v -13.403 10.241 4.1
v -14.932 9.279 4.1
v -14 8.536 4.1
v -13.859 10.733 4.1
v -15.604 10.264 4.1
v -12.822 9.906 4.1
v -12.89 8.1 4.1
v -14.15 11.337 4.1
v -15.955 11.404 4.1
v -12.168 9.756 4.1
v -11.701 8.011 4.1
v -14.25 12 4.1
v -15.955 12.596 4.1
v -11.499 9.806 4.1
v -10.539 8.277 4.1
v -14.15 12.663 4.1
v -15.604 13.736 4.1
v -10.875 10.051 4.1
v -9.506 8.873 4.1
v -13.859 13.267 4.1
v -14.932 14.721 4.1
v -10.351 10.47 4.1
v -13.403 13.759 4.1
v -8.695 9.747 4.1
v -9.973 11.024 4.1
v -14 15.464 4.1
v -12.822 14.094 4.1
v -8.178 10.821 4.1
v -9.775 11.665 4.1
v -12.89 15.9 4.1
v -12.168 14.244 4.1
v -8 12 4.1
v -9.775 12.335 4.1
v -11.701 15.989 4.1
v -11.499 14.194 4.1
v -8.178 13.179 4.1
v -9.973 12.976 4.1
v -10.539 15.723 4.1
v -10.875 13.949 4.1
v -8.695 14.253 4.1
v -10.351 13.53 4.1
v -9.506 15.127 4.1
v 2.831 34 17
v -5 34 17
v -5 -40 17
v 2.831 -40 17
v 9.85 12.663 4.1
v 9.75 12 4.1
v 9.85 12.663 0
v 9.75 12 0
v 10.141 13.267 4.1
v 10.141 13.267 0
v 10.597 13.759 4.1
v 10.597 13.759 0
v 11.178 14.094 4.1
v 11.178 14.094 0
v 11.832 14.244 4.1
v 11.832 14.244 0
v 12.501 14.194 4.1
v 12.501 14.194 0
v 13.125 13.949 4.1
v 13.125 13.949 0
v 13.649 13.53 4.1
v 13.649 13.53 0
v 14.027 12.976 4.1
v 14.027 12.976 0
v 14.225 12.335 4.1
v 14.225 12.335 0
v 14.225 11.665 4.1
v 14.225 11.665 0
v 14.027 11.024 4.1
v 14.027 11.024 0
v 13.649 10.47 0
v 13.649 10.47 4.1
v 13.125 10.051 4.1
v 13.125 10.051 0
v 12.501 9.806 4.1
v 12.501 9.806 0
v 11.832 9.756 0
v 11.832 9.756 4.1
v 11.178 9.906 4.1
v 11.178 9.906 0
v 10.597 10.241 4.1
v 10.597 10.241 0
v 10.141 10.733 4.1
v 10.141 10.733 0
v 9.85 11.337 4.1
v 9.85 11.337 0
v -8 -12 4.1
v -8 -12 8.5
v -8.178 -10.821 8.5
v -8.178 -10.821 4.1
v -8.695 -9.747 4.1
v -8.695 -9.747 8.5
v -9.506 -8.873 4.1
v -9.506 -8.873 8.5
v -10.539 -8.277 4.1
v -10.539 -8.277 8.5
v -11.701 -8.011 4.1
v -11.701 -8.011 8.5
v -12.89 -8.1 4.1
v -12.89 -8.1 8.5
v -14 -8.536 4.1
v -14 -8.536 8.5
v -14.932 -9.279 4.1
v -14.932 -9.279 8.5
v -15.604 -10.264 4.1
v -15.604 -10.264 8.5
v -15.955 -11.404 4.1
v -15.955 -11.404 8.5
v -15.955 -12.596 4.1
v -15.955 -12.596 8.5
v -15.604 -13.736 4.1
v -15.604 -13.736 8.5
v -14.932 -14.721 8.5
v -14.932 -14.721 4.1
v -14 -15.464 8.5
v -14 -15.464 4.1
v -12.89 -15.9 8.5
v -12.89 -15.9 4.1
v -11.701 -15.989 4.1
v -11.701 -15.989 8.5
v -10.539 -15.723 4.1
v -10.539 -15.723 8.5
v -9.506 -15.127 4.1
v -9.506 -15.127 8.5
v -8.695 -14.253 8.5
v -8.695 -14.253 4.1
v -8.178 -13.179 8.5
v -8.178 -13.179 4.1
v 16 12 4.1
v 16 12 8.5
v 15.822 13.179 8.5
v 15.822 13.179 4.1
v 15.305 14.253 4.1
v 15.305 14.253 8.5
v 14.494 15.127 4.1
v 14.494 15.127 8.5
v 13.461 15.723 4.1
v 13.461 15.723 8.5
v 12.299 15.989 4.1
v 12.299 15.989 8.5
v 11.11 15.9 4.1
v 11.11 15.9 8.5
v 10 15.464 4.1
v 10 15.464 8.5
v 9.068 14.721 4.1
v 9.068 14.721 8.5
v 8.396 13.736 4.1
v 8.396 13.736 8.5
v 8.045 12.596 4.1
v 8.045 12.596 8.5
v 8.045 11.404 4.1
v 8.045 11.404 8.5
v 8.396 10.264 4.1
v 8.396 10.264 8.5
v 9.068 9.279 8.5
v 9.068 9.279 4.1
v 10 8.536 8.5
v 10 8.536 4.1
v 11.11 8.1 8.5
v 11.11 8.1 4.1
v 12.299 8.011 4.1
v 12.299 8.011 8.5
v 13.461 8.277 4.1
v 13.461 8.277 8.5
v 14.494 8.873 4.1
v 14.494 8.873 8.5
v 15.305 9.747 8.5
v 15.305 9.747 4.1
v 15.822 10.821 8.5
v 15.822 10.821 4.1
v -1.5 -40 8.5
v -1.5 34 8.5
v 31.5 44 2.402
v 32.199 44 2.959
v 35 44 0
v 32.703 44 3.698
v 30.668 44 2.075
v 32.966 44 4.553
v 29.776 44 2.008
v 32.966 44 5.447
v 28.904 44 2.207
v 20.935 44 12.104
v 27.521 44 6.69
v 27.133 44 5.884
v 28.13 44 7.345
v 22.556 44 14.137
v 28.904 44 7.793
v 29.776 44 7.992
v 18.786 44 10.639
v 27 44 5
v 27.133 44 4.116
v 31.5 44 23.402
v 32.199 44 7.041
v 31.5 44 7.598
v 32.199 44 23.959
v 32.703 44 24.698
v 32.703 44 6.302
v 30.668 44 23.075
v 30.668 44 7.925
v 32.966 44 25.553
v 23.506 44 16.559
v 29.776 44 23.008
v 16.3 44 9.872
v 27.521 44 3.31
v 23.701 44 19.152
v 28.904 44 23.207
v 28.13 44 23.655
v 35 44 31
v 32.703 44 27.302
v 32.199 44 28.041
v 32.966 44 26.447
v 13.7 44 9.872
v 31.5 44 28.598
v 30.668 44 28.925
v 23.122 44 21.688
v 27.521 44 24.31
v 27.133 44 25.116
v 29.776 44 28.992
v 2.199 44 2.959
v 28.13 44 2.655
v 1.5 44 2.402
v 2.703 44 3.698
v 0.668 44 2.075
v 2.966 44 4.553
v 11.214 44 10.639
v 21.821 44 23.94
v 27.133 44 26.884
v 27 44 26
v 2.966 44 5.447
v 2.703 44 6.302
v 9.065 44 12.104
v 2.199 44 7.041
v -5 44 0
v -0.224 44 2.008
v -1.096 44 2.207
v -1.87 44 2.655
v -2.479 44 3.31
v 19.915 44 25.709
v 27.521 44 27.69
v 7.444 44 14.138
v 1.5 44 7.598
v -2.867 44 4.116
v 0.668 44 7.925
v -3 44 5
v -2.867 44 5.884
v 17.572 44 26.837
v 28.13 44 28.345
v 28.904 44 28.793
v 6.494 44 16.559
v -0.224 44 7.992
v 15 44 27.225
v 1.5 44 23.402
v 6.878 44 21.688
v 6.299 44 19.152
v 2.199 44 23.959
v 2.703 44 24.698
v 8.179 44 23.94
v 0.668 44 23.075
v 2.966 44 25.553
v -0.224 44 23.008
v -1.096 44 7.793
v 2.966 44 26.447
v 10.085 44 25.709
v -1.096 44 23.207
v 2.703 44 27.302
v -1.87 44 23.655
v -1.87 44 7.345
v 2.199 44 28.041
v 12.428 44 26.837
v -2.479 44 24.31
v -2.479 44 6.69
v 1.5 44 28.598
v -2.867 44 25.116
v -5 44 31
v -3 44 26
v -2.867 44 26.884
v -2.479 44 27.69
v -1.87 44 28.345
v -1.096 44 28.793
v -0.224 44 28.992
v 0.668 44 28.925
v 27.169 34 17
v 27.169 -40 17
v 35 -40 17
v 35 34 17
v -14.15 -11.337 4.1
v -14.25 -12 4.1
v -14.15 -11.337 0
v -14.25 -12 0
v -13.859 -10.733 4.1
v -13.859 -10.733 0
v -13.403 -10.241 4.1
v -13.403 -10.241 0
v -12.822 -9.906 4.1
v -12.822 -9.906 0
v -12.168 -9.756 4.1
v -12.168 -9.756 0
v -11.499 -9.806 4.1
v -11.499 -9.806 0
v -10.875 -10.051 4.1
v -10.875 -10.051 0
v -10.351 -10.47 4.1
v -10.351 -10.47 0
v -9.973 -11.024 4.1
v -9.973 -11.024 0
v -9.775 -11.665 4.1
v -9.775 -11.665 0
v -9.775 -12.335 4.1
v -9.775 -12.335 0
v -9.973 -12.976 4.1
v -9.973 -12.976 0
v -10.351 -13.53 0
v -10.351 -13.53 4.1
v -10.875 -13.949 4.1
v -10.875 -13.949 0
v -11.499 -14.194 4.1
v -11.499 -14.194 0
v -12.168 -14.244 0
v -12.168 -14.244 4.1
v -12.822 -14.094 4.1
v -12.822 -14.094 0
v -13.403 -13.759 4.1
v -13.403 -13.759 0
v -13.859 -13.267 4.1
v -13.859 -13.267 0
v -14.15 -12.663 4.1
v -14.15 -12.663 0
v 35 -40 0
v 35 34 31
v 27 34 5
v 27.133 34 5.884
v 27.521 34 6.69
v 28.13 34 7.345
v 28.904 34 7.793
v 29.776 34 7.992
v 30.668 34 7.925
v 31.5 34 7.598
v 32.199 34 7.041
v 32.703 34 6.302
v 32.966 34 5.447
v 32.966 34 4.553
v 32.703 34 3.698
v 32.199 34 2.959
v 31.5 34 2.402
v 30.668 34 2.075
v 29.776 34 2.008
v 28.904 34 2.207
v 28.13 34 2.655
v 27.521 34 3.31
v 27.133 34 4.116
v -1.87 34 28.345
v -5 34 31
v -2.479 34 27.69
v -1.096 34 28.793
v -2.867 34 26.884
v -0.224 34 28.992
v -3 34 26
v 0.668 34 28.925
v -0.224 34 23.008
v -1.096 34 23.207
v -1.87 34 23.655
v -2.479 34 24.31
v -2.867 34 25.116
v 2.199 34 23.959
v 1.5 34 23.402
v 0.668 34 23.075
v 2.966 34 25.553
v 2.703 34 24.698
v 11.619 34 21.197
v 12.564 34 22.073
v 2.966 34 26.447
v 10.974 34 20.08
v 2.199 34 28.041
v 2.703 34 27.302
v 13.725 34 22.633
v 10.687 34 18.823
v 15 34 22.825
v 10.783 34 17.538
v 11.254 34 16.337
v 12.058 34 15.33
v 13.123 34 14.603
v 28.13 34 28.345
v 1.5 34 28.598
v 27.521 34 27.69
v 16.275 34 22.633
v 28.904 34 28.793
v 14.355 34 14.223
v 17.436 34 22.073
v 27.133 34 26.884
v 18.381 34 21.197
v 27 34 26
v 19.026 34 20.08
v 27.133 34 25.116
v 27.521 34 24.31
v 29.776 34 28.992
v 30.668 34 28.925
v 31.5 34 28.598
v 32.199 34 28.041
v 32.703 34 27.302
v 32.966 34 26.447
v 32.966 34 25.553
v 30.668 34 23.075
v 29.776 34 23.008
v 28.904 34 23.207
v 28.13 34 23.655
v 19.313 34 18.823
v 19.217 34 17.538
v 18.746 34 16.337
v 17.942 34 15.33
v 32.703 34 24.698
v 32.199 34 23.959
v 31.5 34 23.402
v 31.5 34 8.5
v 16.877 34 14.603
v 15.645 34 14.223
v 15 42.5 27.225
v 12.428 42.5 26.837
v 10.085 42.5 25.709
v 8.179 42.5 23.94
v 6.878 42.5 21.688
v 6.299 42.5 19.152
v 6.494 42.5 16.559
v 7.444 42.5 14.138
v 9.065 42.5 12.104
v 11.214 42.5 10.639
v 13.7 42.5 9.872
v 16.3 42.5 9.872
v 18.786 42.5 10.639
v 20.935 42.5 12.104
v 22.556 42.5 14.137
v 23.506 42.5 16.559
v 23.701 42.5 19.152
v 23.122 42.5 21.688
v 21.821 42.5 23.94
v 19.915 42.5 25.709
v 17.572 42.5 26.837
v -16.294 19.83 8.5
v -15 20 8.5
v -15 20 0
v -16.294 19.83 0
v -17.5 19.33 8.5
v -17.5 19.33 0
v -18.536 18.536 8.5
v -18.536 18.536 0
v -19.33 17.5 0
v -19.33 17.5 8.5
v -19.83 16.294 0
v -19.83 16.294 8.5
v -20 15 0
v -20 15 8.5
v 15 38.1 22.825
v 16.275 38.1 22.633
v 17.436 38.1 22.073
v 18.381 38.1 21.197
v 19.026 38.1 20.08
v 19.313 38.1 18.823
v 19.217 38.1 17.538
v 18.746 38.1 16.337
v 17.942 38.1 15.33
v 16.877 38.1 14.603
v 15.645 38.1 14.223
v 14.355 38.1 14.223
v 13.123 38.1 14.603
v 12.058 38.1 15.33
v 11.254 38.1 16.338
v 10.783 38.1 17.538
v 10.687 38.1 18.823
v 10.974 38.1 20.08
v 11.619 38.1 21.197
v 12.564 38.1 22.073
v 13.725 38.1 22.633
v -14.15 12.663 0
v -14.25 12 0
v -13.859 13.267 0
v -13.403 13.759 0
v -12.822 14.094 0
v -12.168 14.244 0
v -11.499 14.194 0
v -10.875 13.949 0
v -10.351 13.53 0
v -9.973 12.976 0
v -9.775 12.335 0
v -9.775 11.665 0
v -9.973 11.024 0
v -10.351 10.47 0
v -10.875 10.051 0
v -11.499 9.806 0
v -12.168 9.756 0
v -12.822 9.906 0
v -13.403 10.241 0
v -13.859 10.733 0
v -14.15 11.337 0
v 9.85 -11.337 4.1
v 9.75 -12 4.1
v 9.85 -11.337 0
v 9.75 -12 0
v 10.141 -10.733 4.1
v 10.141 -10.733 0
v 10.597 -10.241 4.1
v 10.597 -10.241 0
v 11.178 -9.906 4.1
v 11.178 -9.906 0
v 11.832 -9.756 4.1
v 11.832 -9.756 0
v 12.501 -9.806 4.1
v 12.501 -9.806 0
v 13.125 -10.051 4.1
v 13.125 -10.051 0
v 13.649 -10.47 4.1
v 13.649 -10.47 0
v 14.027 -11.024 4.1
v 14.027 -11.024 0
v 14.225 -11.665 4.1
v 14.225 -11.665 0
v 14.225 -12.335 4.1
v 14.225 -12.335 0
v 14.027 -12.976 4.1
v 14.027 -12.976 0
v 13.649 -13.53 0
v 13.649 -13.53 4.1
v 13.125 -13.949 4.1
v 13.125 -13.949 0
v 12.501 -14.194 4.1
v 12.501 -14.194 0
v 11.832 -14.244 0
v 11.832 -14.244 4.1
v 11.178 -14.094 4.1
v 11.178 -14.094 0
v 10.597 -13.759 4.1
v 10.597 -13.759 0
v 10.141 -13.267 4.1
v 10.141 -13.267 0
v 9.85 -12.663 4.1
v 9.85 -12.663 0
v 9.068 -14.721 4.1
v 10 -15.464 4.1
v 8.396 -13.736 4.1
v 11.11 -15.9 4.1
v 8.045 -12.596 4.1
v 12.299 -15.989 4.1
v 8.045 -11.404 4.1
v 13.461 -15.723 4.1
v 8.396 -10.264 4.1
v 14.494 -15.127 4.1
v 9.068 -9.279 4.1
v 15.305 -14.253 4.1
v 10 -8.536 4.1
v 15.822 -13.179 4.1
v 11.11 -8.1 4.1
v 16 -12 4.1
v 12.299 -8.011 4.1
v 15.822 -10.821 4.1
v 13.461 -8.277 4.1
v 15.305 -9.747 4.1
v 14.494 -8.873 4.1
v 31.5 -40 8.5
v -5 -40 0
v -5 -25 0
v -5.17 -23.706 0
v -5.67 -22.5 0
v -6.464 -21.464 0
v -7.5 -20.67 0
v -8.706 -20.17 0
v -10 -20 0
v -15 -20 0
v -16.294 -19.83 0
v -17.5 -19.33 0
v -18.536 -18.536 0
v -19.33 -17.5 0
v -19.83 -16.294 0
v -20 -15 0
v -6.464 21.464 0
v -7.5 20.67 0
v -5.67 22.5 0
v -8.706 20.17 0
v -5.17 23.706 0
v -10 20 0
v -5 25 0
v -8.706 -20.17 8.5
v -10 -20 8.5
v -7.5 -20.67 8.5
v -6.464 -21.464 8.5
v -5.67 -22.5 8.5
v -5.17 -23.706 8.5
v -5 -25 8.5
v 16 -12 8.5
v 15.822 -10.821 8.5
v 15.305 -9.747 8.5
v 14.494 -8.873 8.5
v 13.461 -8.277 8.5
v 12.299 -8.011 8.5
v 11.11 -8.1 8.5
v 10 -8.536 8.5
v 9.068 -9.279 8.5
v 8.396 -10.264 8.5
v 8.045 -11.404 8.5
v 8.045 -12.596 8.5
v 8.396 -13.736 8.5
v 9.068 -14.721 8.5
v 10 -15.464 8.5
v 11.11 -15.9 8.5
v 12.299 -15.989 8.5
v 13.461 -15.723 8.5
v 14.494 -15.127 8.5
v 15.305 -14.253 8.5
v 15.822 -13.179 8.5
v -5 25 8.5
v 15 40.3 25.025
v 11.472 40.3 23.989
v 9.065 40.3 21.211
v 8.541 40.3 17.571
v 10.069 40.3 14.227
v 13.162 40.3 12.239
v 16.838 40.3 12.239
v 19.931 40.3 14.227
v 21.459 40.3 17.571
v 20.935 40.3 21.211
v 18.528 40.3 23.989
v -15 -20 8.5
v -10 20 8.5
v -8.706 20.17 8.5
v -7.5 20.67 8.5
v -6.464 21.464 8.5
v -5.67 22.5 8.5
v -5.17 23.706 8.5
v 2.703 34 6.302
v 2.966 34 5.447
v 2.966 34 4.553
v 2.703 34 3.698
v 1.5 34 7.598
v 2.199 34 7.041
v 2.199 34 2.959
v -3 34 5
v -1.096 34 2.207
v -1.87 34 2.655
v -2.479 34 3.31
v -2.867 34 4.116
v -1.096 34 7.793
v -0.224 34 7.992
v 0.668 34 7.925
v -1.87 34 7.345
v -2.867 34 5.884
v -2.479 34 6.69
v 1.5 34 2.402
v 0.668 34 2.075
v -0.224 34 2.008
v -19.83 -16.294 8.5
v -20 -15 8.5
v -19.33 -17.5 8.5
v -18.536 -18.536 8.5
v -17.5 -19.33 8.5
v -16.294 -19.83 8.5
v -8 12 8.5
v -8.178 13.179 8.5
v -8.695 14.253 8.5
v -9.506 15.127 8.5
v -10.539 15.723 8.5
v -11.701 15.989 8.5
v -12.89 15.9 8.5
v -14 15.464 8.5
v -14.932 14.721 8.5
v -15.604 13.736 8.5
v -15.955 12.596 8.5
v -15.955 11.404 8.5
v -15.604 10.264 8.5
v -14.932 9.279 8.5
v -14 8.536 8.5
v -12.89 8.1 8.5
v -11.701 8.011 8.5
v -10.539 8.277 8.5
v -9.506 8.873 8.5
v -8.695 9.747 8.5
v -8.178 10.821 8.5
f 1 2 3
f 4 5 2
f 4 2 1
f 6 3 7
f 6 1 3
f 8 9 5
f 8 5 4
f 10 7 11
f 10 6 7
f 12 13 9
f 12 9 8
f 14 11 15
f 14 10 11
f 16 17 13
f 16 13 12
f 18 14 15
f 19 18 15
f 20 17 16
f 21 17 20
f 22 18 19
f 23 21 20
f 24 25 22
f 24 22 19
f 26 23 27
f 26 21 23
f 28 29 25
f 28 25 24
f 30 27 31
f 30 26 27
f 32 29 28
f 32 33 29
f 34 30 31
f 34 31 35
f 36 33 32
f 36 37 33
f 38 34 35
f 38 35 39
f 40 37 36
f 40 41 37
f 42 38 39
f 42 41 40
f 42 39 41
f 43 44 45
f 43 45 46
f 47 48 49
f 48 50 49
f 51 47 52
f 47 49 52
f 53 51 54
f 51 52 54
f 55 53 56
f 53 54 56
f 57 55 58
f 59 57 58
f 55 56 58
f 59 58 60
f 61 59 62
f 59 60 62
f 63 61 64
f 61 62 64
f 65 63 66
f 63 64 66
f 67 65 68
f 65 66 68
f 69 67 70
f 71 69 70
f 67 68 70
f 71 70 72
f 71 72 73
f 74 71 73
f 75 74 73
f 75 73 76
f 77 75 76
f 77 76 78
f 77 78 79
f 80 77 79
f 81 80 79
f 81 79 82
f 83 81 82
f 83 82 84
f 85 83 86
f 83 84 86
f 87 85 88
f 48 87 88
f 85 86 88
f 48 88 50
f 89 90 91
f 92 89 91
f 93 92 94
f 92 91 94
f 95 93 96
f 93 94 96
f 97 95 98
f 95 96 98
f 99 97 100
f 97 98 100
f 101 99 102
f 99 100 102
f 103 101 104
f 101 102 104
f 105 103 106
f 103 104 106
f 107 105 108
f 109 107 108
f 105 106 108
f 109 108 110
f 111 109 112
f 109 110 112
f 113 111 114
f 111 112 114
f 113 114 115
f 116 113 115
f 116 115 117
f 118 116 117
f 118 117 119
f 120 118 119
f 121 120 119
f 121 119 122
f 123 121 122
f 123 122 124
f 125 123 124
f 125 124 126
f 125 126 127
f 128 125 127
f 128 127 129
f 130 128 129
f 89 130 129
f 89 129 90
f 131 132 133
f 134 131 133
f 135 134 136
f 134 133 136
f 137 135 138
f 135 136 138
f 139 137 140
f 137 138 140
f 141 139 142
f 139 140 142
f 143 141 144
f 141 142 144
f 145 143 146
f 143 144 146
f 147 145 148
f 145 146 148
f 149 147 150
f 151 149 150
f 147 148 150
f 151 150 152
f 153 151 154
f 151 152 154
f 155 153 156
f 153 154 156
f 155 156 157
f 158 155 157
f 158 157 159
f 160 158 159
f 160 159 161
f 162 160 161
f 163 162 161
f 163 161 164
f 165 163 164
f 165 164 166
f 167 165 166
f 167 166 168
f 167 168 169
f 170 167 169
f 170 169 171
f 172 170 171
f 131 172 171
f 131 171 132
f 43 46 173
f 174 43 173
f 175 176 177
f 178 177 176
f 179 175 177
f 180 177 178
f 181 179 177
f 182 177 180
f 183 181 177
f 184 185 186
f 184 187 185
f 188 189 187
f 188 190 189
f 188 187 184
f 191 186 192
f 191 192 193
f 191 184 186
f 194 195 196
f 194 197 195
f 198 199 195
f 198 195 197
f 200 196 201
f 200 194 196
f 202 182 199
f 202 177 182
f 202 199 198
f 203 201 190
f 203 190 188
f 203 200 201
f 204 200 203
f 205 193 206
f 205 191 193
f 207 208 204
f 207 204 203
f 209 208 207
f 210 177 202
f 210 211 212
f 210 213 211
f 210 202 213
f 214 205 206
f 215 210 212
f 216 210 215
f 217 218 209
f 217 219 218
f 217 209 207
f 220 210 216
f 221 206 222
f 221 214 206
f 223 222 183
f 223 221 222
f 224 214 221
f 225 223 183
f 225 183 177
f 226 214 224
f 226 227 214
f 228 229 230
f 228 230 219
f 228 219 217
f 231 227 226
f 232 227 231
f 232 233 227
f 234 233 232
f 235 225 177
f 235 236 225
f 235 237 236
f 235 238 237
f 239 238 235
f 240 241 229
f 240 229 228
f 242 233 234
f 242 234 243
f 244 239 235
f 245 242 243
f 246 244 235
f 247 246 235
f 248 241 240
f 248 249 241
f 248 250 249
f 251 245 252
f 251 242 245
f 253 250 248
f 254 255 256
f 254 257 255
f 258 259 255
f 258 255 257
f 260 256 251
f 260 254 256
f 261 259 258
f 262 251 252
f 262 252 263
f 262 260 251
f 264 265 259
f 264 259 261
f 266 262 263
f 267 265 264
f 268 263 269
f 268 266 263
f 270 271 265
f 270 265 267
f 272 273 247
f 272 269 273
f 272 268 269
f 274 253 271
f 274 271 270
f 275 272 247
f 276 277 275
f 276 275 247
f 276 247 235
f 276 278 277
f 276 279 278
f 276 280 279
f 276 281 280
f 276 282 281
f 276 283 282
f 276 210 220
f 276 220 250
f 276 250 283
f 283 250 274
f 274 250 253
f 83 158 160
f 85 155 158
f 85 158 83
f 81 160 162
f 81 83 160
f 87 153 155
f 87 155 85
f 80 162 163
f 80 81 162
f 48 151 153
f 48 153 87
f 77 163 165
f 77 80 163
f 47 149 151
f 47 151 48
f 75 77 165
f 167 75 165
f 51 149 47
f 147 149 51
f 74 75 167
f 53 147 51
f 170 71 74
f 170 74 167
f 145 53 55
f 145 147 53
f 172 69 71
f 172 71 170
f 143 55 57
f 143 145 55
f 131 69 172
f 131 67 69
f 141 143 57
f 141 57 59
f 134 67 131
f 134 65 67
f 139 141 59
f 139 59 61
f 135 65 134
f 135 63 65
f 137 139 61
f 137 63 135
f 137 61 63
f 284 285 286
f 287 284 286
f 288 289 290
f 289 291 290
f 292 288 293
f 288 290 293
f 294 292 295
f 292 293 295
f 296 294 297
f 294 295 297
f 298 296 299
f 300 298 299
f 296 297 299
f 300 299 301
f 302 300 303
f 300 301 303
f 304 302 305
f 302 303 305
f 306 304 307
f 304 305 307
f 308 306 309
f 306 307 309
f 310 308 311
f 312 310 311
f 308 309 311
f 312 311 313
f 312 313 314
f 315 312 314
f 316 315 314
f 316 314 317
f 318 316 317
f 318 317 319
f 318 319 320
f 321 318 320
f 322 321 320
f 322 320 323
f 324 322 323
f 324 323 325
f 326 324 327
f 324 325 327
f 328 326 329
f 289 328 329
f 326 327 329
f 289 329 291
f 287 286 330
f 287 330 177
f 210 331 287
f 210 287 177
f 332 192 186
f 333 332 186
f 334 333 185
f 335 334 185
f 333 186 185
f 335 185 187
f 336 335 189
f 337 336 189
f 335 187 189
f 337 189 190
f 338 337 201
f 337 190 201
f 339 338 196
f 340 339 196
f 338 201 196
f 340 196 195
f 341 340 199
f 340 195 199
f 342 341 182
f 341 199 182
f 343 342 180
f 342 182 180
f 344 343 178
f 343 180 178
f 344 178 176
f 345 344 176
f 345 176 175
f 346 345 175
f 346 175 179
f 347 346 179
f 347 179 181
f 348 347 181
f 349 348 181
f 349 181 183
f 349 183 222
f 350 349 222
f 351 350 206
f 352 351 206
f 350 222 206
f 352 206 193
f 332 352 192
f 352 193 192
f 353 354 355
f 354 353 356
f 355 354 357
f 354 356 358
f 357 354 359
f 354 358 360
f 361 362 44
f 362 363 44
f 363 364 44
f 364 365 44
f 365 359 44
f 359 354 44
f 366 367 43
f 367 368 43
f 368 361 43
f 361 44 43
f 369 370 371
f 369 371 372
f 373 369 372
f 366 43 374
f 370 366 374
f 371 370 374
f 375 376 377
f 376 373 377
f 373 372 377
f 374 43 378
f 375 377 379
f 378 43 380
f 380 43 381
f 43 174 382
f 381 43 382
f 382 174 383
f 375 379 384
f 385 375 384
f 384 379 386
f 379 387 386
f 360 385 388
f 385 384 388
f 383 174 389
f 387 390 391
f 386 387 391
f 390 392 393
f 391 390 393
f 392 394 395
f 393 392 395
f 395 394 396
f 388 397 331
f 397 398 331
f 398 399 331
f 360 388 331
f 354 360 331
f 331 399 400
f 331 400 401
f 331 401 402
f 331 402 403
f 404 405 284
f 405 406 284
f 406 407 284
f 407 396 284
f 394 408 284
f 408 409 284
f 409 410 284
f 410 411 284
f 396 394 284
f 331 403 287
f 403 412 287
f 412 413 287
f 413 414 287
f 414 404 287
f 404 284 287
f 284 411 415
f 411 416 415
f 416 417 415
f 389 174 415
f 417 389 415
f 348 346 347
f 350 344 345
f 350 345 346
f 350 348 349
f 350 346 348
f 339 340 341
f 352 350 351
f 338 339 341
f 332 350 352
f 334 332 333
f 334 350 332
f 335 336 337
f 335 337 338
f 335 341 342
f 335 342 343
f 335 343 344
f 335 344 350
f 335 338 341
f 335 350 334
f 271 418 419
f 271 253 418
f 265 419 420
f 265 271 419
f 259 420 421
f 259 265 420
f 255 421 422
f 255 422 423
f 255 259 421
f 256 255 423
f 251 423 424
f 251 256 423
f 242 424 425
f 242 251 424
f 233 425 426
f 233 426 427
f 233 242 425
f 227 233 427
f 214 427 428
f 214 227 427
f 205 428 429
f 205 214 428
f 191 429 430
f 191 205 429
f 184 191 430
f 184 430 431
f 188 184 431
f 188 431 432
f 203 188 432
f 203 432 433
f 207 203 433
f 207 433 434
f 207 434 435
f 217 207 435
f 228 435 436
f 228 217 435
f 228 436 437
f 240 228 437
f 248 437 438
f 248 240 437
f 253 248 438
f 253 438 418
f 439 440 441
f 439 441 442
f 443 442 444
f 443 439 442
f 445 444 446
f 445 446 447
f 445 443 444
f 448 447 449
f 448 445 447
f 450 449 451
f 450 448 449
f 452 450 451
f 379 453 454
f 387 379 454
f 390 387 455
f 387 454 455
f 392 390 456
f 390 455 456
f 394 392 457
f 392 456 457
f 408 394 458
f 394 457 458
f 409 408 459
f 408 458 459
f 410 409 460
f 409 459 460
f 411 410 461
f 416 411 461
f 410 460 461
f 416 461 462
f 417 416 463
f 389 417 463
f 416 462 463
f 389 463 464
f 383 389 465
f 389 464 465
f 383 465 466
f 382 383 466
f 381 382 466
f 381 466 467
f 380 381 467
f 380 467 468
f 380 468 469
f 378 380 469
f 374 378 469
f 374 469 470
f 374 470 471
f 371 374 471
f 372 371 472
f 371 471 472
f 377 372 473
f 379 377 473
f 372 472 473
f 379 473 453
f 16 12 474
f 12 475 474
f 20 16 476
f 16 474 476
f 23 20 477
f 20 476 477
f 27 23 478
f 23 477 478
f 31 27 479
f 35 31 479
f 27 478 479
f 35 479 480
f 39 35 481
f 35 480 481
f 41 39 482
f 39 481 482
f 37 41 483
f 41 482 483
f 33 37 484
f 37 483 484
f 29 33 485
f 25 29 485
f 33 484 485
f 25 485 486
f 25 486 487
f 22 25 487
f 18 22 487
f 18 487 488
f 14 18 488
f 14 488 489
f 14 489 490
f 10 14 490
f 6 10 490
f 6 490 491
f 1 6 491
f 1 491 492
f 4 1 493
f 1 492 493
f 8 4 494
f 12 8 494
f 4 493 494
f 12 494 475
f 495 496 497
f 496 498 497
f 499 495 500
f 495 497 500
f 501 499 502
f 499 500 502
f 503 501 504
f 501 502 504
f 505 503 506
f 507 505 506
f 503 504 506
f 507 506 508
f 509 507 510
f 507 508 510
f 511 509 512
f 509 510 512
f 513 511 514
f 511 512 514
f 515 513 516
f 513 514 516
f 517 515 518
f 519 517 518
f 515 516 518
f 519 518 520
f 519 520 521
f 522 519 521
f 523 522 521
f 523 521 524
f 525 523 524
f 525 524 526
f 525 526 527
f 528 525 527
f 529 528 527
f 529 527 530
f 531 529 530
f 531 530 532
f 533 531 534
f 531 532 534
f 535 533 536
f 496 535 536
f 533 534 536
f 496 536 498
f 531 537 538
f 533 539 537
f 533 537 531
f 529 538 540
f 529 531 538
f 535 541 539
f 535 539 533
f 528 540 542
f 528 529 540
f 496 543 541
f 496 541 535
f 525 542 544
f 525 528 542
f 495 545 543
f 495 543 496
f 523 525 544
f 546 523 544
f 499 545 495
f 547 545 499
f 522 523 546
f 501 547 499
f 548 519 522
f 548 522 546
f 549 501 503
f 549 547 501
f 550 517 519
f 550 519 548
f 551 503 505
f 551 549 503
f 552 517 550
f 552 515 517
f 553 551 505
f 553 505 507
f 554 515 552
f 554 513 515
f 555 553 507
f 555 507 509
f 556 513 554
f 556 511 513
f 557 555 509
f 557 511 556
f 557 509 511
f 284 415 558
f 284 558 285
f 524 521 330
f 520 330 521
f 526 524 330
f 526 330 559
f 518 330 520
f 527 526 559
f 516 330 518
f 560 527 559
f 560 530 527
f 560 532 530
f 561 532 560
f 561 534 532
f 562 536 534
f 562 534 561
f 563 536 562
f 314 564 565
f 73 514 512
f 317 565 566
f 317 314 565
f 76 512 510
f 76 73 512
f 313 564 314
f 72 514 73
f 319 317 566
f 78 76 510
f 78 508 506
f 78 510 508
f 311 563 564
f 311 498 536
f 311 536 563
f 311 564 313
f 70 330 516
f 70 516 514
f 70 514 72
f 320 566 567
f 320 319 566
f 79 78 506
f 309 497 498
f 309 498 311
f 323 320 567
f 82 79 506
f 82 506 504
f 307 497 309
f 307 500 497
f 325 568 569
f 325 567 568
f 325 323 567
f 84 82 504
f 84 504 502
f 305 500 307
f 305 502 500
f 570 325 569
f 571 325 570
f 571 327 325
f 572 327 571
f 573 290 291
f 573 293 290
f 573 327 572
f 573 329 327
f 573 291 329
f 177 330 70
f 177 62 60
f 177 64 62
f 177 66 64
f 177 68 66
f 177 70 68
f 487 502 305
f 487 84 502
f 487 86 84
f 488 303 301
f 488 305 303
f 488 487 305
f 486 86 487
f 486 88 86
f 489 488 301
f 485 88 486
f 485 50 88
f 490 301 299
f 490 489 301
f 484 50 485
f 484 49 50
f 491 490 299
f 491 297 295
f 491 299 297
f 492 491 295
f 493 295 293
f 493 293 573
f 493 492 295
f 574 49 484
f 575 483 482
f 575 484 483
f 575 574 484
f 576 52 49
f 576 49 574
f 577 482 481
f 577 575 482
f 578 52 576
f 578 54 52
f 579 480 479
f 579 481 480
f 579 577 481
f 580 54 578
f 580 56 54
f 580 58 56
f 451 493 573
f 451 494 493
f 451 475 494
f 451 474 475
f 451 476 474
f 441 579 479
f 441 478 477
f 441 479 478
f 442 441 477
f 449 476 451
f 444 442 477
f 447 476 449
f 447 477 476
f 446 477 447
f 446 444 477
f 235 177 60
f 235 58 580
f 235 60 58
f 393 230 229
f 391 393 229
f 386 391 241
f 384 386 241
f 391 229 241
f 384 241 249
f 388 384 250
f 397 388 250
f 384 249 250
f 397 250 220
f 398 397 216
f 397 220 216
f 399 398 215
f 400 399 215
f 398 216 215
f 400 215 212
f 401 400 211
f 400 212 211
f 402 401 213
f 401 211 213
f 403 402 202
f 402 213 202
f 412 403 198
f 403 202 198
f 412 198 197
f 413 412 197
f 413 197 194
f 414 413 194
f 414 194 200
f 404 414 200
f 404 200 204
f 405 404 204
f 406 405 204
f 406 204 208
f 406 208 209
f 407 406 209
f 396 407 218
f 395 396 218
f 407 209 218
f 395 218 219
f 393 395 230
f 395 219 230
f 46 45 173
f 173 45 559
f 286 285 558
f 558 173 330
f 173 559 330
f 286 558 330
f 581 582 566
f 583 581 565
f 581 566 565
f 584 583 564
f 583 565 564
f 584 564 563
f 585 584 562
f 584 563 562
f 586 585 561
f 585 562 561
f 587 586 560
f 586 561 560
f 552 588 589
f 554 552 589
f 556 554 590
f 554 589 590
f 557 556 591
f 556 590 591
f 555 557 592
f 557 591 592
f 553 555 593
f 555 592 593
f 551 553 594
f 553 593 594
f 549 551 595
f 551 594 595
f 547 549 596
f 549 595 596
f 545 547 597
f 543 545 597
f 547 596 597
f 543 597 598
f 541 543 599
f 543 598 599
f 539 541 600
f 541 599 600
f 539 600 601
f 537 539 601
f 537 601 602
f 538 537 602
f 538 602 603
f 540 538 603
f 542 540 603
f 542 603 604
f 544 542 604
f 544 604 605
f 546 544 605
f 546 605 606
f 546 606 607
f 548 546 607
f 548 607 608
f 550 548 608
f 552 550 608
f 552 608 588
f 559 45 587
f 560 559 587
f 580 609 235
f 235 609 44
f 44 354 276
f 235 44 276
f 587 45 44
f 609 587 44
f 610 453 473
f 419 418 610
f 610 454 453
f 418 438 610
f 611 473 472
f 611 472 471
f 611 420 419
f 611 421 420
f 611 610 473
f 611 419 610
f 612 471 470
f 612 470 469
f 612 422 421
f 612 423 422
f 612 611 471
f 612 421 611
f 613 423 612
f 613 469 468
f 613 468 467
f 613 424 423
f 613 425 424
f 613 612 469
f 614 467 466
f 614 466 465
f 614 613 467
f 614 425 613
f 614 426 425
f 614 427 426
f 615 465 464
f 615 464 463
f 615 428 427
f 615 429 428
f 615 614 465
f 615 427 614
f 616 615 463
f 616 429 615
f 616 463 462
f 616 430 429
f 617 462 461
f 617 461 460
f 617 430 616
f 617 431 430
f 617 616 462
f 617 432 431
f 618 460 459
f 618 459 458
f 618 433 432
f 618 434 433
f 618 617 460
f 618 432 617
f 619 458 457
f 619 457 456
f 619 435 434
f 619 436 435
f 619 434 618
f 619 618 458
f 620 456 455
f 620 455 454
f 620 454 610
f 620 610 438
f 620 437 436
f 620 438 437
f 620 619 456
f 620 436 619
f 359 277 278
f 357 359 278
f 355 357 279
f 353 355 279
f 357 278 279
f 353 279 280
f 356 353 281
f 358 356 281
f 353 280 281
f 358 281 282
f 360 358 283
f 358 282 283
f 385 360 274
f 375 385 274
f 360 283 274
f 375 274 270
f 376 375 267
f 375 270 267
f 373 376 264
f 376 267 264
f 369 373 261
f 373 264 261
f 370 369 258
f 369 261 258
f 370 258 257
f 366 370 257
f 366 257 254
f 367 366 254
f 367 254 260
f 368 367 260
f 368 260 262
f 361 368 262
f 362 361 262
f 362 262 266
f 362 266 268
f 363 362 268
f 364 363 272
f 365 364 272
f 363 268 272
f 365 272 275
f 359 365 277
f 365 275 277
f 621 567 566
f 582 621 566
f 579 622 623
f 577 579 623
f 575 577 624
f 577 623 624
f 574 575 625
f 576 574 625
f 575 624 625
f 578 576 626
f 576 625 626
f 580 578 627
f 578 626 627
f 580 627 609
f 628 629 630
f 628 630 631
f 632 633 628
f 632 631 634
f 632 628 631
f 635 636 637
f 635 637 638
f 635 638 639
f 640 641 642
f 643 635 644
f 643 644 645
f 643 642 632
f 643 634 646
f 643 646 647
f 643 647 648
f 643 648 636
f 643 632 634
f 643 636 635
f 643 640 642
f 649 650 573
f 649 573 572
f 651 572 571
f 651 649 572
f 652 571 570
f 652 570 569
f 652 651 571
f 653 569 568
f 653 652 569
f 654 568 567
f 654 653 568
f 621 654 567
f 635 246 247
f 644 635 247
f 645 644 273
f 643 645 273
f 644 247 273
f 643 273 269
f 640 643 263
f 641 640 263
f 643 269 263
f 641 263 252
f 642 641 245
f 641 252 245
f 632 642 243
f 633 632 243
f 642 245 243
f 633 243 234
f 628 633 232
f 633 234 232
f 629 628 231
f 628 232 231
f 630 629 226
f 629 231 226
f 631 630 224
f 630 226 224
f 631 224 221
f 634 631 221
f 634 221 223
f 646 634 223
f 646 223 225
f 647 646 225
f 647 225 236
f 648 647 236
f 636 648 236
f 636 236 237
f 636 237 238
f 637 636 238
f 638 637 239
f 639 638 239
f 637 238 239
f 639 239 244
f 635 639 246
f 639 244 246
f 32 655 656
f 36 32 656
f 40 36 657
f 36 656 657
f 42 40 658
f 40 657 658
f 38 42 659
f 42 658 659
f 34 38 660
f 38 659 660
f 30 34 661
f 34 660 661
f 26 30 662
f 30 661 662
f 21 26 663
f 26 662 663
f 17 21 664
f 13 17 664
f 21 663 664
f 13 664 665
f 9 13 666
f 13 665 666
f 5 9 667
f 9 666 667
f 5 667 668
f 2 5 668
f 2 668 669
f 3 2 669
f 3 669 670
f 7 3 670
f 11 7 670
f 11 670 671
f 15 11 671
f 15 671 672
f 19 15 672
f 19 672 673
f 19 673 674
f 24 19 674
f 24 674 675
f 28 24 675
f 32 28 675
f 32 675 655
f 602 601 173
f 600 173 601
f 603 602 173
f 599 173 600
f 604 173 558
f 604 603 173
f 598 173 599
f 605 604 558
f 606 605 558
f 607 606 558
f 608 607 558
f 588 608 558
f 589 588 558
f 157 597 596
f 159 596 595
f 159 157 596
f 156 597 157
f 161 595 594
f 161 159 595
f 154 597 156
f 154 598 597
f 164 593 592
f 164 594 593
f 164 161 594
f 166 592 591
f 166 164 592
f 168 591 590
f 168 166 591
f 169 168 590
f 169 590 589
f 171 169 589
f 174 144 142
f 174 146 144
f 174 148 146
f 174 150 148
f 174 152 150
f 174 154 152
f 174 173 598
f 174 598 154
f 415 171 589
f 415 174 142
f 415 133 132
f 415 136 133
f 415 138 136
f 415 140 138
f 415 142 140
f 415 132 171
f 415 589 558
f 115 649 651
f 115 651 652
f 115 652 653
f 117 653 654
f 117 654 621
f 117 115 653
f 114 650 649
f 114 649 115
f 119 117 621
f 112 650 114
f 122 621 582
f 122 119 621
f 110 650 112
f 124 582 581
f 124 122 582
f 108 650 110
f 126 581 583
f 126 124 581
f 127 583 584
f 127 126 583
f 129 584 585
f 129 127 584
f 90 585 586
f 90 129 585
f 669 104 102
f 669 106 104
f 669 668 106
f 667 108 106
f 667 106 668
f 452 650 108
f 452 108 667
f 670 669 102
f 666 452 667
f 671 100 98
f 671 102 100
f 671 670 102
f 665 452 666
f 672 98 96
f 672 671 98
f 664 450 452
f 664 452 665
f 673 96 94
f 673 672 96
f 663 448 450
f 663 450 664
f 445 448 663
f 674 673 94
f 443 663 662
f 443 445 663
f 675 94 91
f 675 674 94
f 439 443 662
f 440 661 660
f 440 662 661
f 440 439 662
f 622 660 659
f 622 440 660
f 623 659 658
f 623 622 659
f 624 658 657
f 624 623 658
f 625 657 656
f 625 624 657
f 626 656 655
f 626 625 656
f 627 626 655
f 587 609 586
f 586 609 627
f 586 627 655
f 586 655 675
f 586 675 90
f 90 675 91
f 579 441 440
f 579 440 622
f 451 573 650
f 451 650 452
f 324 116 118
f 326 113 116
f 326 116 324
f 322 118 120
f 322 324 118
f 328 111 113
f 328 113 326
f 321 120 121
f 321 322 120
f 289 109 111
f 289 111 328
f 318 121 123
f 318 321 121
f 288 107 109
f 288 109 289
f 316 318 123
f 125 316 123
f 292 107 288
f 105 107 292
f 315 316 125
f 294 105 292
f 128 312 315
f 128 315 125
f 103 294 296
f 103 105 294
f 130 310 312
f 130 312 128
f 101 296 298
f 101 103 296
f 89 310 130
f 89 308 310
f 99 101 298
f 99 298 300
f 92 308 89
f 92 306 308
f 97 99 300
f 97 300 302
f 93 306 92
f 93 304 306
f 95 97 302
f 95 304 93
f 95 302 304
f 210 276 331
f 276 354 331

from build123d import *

# Parameters (mm, degrees)
BOSS_EXTRUDE1_OUTLINE_W                             = 55
BOSS_EXTRUDE1_OUTLINE_H                             = 40
BOSS_EXTRUDE1_DEPTH                                 = 10
SKETCH5_W                                           = 40
SKETCH5_H                                           = 14
BOSS_EXTRUDE2_DEPTH                                 = 40
CUT_EXTRUDE3_DEPTH                                  = 74
SKETCH7_W                                           = 40
SKETCH7_H                                           = 6
BOSS_EXTRUDE3_DEPTH                                 = 14
SKETCH11_W                                          = 40
SKETCH11_H                                          = 28
BOSS_EXTRUDE5_DEPTH                                 = 4
SKETCH12_W                                          = 40
SKETCH12_H                                          = 24
SKETCH12_H_2                                        = 20
BOSS_EXTRUDE6_DEPTH                                 = 3
FILLET1_R                                           = 5
SKETCH23_R                                          = 3
CUT_EXTRUDE11_DEPTH                                 = 10
SKETCH26_R                                          = 4.325
CUT_EXTRUDE12_DEPTH                                 = 4.1
CUT_EXTRUDE13_DEPTH                                 = 1.5
CBORE_FOR_M4_HEX_SOCKET_HEAD_CAP_SCREW1_D           = 4.5
CBORE_FOR_M4_HEX_SOCKET_HEAD_CAP_SCREW1_CBORE_D     = 8
CBORE_FOR_M4_HEX_SOCKET_HEAD_CAP_SCREW1_CBORE_DEPTH = 4.4


# Read off the part's stored shape, not the designer's step: Boss-Extrude1
with BuildPart() as part:
    # Boss-Extrude1 outline → Boss-Extrude1 (new body)
    with BuildSketch(Plane.XY):
        with Locations((7.5, 0)):
            Rectangle(BOSS_EXTRUDE1_OUTLINE_W, BOSS_EXTRUDE1_OUTLINE_H)
    extrude(amount=BOSS_EXTRUDE1_DEPTH)

    # Sketch5 → Boss-Extrude2 (add, symmetric)
    with BuildSketch(Plane(origin=(0, 0, 0), x_dir=(1, 0, 0), z_dir=(0, 1, 0))):
        with Locations((15, -10)):
            Rectangle(SKETCH5_W, SKETCH5_H)
    extrude(amount=BOSS_EXTRUDE2_DEPTH, both=True)

    # Sketch6 → Cut-Extrude3 (cut)
    with BuildSketch(Plane(origin=(0, 34, 0), x_dir=(1, 0, 0), z_dir=(0, 1, 0))):
        Polygon((-1.5, -8.5), (31.5, -8.5), (27.169033679, -17), (2.830966321, -17), align=None)
    extrude(amount=-CUT_EXTRUDE3_DEPTH, mode=Mode.SUBTRACT)

    # Sketch7 → Boss-Extrude3 (add)
    with BuildSketch(Plane.XY.offset(17)):
        with Locations((15, 37)):
            Rectangle(SKETCH7_W, SKETCH7_H)
    extrude(amount=BOSS_EXTRUDE3_DEPTH)

    # Sketch11 → Boss-Extrude5 (add)
    with BuildSketch(Plane(origin=(0, 40, 0), x_dir=(1, 0, 0), z_dir=(0, 1, 0))):
        with Locations((15, -17)):
            Rectangle(SKETCH11_W, SKETCH11_H)
    extrude(amount=BOSS_EXTRUDE5_DEPTH)

    # Sketch12 → Boss-Extrude6 (add)
    with BuildSketch(Plane(origin=(0, 0, 3), x_dir=(-1, 0, 0), z_dir=(0, 0, -1))):
        with Locations((-15, 32)):
            Rectangle(SKETCH12_W, SKETCH12_H)
        with Locations((-15, -30)):
            Rectangle(SKETCH12_W, SKETCH12_H_2)
    extrude(amount=BOSS_EXTRUDE6_DEPTH)

    # Fillet1
    fillet1_edges = [part.edges().sort_by_distance(p)[0] for p in [
        (-5, -20, 5),
        (-5, 20, 5),
        (-20, 20, 5),
        (-20, -20, 5),
    ]]
    fillet(fillet1_edges, radius=FILLET1_R)

    # Sketch23 → Cut-Extrude11 (cut)
    with BuildSketch(Plane(origin=(0, 44, 0), x_dir=(1, 0, 0), z_dir=(0, 1, 0))):
        with Locations(Location((0, -5, 0), (0, 0, 180))):
            Circle(SKETCH23_R)
        with Locations(Location((30, -5, 0), (0, 0, 180))):
            Circle(SKETCH23_R)
        with Locations(Location((30, -26, 0), (0, 0, 180))):
            Circle(SKETCH23_R)
        with Locations(Location((0, -26, 0), (0, 0, 180))):
            Circle(SKETCH23_R)
    extrude(amount=-CUT_EXTRUDE11_DEPTH, mode=Mode.SUBTRACT)

    # Sketch25 → Cut-Revolve1 (revolve, cut)
    with BuildSketch(Plane.XY.offset(18.5), mode=Mode.PRIVATE) as cut_revolve1_sk:
        Polygon((15, 44), (15, 38.1), (19.325, 38.1), (23.725, 42.5), (23.725, 44), align=None)
    revolve(cut_revolve1_sk.sketch.rotate(Axis((15, 44, 18.5), (0, -1, 0)), 90), axis=Axis((15, 44, 18.5), (0, -1, 0)), mode=Mode.SUBTRACT)

    # Sketch26 → Cut-Extrude12 (cut)
    with BuildSketch(Plane(origin=(0, 38.1, 0), x_dir=(1, 0, 0), z_dir=(0, 1, 0))):
        with Locations(Location((15, -18.5, 0), (0, 0, 270))):
            Circle(SKETCH26_R)
    extrude(amount=-CUT_EXTRUDE12_DEPTH, mode=Mode.SUBTRACT)

    # Sketch28 → Cut-Extrude13 (cut)
    with BuildSketch(Plane.XY.offset(10)):
        with BuildLine():
            Line((-15, -20), (-10, -20))
            ThreePointArc((-10, -20), (-6.464466094, -21.464466094), (-5, -25))
            Line((-5, -25), (-5, 25))
            ThreePointArc((-5, 25), (-6.464466094, 21.464466094), (-10, 20))
            Line((-10, 20), (-15, 20))
            ThreePointArc((-15, 20), (-18.535533906, 18.535533906), (-20, 15))
            Line((-20, 15), (-20, -15))
            ThreePointArc((-20, -15), (-18.535533906, -18.535533906), (-15, -20))
        make_face()
    extrude(amount=-CUT_EXTRUDE13_DEPTH, mode=Mode.SUBTRACT)

    # CBORE for M4 Hex Socket Head Cap Screw1 (through all)
    with Locations(Plane.XY.offset(8.5)):
        with Locations((-12, 12), (12, 12), (12, -12), (-12, -12)):
            CounterBoreHole(CBORE_FOR_M4_HEX_SOCKET_HEAD_CAP_SCREW1_D / 2, CBORE_FOR_M4_HEX_SOCKET_HEAD_CAP_SCREW1_CBORE_D / 2, CBORE_FOR_M4_HEX_SOCKET_HEAD_CAP_SCREW1_CBORE_DEPTH)


solid = part.part
